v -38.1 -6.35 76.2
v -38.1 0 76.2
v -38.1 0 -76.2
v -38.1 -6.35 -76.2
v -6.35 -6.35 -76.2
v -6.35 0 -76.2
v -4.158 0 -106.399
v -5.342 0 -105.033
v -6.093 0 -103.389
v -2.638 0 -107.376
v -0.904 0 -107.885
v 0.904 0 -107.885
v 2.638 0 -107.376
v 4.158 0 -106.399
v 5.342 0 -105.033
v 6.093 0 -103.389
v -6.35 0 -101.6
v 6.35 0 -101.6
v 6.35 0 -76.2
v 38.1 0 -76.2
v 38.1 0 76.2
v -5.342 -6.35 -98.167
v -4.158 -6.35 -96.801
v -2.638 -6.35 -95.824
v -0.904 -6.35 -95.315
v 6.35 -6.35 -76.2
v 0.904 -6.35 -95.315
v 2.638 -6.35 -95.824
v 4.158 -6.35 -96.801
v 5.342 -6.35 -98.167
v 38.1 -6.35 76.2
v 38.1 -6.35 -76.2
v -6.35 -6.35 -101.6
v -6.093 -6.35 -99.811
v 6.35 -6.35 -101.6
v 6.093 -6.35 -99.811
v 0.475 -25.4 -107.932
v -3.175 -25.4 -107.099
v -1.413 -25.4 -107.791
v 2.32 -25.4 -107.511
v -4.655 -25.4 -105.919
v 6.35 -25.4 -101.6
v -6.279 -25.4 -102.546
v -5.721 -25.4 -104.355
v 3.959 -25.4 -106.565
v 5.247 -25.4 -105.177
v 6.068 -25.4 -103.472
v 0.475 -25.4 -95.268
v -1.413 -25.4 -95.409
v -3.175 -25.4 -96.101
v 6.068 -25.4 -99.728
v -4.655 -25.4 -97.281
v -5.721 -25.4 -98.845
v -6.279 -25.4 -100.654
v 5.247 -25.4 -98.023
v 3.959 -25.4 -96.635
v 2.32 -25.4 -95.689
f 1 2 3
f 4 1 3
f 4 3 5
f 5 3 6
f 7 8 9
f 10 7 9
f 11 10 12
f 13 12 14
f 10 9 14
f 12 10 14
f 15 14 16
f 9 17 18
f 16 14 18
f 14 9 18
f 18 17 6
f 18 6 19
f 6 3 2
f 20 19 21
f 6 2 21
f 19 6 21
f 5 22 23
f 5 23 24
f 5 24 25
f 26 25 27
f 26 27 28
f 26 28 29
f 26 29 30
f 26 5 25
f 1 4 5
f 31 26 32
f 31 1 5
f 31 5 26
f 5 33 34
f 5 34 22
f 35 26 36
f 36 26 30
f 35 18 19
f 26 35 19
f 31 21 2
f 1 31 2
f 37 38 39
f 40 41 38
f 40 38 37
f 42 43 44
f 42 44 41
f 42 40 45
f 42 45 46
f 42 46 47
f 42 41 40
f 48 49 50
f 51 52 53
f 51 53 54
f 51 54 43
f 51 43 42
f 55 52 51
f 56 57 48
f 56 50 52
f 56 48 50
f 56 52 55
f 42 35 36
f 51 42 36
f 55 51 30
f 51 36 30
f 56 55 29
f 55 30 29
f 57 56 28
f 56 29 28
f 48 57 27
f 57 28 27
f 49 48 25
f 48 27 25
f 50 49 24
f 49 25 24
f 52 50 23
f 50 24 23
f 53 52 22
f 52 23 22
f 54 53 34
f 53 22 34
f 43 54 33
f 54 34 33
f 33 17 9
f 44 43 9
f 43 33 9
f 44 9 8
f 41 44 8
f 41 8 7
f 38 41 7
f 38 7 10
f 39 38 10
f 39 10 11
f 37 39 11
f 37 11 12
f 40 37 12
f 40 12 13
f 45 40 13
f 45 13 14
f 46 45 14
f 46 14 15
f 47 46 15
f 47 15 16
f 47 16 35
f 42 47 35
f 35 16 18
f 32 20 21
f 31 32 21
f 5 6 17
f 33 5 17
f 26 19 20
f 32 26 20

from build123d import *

# Parameters (mm, degrees)
F1_DEPTH = 6.35
F2_DEPTH = 25.4


with BuildPart() as f1:
    # F0 (on Front) → F1 (new body)
    with BuildSketch(Plane.XZ):
        Polygon((6.35, -76.2), (38.1, -76.2), (38.1, 76.2), (-38.1, 76.2), (-38.1, -76.2), (-6.35, -76.2), align=None)
        with BuildLine():
            Line((6.35, -101.6), (6.35, -76.2))
            Line((6.35, -76.2), (-6.35, -76.2))
            Line((-6.35, -76.2), (-6.35, -101.6))
            ThreePointArc((-6.35, -101.6), (0, -95.25), (6.35, -101.6))
        make_face()
    extrude(amount=F1_DEPTH)

    # F0 (on Front) → F2 (join)
    with BuildSketch(Plane.XZ):
        with BuildLine():
            ThreePointArc((-6.35, -101.6), (0, -107.95), (6.35, -101.6))
            ThreePointArc((6.35, -101.6), (0, -95.25), (-6.35, -101.6))
        make_face()
    extrude(amount=F2_DEPTH)


solid = f1.part
